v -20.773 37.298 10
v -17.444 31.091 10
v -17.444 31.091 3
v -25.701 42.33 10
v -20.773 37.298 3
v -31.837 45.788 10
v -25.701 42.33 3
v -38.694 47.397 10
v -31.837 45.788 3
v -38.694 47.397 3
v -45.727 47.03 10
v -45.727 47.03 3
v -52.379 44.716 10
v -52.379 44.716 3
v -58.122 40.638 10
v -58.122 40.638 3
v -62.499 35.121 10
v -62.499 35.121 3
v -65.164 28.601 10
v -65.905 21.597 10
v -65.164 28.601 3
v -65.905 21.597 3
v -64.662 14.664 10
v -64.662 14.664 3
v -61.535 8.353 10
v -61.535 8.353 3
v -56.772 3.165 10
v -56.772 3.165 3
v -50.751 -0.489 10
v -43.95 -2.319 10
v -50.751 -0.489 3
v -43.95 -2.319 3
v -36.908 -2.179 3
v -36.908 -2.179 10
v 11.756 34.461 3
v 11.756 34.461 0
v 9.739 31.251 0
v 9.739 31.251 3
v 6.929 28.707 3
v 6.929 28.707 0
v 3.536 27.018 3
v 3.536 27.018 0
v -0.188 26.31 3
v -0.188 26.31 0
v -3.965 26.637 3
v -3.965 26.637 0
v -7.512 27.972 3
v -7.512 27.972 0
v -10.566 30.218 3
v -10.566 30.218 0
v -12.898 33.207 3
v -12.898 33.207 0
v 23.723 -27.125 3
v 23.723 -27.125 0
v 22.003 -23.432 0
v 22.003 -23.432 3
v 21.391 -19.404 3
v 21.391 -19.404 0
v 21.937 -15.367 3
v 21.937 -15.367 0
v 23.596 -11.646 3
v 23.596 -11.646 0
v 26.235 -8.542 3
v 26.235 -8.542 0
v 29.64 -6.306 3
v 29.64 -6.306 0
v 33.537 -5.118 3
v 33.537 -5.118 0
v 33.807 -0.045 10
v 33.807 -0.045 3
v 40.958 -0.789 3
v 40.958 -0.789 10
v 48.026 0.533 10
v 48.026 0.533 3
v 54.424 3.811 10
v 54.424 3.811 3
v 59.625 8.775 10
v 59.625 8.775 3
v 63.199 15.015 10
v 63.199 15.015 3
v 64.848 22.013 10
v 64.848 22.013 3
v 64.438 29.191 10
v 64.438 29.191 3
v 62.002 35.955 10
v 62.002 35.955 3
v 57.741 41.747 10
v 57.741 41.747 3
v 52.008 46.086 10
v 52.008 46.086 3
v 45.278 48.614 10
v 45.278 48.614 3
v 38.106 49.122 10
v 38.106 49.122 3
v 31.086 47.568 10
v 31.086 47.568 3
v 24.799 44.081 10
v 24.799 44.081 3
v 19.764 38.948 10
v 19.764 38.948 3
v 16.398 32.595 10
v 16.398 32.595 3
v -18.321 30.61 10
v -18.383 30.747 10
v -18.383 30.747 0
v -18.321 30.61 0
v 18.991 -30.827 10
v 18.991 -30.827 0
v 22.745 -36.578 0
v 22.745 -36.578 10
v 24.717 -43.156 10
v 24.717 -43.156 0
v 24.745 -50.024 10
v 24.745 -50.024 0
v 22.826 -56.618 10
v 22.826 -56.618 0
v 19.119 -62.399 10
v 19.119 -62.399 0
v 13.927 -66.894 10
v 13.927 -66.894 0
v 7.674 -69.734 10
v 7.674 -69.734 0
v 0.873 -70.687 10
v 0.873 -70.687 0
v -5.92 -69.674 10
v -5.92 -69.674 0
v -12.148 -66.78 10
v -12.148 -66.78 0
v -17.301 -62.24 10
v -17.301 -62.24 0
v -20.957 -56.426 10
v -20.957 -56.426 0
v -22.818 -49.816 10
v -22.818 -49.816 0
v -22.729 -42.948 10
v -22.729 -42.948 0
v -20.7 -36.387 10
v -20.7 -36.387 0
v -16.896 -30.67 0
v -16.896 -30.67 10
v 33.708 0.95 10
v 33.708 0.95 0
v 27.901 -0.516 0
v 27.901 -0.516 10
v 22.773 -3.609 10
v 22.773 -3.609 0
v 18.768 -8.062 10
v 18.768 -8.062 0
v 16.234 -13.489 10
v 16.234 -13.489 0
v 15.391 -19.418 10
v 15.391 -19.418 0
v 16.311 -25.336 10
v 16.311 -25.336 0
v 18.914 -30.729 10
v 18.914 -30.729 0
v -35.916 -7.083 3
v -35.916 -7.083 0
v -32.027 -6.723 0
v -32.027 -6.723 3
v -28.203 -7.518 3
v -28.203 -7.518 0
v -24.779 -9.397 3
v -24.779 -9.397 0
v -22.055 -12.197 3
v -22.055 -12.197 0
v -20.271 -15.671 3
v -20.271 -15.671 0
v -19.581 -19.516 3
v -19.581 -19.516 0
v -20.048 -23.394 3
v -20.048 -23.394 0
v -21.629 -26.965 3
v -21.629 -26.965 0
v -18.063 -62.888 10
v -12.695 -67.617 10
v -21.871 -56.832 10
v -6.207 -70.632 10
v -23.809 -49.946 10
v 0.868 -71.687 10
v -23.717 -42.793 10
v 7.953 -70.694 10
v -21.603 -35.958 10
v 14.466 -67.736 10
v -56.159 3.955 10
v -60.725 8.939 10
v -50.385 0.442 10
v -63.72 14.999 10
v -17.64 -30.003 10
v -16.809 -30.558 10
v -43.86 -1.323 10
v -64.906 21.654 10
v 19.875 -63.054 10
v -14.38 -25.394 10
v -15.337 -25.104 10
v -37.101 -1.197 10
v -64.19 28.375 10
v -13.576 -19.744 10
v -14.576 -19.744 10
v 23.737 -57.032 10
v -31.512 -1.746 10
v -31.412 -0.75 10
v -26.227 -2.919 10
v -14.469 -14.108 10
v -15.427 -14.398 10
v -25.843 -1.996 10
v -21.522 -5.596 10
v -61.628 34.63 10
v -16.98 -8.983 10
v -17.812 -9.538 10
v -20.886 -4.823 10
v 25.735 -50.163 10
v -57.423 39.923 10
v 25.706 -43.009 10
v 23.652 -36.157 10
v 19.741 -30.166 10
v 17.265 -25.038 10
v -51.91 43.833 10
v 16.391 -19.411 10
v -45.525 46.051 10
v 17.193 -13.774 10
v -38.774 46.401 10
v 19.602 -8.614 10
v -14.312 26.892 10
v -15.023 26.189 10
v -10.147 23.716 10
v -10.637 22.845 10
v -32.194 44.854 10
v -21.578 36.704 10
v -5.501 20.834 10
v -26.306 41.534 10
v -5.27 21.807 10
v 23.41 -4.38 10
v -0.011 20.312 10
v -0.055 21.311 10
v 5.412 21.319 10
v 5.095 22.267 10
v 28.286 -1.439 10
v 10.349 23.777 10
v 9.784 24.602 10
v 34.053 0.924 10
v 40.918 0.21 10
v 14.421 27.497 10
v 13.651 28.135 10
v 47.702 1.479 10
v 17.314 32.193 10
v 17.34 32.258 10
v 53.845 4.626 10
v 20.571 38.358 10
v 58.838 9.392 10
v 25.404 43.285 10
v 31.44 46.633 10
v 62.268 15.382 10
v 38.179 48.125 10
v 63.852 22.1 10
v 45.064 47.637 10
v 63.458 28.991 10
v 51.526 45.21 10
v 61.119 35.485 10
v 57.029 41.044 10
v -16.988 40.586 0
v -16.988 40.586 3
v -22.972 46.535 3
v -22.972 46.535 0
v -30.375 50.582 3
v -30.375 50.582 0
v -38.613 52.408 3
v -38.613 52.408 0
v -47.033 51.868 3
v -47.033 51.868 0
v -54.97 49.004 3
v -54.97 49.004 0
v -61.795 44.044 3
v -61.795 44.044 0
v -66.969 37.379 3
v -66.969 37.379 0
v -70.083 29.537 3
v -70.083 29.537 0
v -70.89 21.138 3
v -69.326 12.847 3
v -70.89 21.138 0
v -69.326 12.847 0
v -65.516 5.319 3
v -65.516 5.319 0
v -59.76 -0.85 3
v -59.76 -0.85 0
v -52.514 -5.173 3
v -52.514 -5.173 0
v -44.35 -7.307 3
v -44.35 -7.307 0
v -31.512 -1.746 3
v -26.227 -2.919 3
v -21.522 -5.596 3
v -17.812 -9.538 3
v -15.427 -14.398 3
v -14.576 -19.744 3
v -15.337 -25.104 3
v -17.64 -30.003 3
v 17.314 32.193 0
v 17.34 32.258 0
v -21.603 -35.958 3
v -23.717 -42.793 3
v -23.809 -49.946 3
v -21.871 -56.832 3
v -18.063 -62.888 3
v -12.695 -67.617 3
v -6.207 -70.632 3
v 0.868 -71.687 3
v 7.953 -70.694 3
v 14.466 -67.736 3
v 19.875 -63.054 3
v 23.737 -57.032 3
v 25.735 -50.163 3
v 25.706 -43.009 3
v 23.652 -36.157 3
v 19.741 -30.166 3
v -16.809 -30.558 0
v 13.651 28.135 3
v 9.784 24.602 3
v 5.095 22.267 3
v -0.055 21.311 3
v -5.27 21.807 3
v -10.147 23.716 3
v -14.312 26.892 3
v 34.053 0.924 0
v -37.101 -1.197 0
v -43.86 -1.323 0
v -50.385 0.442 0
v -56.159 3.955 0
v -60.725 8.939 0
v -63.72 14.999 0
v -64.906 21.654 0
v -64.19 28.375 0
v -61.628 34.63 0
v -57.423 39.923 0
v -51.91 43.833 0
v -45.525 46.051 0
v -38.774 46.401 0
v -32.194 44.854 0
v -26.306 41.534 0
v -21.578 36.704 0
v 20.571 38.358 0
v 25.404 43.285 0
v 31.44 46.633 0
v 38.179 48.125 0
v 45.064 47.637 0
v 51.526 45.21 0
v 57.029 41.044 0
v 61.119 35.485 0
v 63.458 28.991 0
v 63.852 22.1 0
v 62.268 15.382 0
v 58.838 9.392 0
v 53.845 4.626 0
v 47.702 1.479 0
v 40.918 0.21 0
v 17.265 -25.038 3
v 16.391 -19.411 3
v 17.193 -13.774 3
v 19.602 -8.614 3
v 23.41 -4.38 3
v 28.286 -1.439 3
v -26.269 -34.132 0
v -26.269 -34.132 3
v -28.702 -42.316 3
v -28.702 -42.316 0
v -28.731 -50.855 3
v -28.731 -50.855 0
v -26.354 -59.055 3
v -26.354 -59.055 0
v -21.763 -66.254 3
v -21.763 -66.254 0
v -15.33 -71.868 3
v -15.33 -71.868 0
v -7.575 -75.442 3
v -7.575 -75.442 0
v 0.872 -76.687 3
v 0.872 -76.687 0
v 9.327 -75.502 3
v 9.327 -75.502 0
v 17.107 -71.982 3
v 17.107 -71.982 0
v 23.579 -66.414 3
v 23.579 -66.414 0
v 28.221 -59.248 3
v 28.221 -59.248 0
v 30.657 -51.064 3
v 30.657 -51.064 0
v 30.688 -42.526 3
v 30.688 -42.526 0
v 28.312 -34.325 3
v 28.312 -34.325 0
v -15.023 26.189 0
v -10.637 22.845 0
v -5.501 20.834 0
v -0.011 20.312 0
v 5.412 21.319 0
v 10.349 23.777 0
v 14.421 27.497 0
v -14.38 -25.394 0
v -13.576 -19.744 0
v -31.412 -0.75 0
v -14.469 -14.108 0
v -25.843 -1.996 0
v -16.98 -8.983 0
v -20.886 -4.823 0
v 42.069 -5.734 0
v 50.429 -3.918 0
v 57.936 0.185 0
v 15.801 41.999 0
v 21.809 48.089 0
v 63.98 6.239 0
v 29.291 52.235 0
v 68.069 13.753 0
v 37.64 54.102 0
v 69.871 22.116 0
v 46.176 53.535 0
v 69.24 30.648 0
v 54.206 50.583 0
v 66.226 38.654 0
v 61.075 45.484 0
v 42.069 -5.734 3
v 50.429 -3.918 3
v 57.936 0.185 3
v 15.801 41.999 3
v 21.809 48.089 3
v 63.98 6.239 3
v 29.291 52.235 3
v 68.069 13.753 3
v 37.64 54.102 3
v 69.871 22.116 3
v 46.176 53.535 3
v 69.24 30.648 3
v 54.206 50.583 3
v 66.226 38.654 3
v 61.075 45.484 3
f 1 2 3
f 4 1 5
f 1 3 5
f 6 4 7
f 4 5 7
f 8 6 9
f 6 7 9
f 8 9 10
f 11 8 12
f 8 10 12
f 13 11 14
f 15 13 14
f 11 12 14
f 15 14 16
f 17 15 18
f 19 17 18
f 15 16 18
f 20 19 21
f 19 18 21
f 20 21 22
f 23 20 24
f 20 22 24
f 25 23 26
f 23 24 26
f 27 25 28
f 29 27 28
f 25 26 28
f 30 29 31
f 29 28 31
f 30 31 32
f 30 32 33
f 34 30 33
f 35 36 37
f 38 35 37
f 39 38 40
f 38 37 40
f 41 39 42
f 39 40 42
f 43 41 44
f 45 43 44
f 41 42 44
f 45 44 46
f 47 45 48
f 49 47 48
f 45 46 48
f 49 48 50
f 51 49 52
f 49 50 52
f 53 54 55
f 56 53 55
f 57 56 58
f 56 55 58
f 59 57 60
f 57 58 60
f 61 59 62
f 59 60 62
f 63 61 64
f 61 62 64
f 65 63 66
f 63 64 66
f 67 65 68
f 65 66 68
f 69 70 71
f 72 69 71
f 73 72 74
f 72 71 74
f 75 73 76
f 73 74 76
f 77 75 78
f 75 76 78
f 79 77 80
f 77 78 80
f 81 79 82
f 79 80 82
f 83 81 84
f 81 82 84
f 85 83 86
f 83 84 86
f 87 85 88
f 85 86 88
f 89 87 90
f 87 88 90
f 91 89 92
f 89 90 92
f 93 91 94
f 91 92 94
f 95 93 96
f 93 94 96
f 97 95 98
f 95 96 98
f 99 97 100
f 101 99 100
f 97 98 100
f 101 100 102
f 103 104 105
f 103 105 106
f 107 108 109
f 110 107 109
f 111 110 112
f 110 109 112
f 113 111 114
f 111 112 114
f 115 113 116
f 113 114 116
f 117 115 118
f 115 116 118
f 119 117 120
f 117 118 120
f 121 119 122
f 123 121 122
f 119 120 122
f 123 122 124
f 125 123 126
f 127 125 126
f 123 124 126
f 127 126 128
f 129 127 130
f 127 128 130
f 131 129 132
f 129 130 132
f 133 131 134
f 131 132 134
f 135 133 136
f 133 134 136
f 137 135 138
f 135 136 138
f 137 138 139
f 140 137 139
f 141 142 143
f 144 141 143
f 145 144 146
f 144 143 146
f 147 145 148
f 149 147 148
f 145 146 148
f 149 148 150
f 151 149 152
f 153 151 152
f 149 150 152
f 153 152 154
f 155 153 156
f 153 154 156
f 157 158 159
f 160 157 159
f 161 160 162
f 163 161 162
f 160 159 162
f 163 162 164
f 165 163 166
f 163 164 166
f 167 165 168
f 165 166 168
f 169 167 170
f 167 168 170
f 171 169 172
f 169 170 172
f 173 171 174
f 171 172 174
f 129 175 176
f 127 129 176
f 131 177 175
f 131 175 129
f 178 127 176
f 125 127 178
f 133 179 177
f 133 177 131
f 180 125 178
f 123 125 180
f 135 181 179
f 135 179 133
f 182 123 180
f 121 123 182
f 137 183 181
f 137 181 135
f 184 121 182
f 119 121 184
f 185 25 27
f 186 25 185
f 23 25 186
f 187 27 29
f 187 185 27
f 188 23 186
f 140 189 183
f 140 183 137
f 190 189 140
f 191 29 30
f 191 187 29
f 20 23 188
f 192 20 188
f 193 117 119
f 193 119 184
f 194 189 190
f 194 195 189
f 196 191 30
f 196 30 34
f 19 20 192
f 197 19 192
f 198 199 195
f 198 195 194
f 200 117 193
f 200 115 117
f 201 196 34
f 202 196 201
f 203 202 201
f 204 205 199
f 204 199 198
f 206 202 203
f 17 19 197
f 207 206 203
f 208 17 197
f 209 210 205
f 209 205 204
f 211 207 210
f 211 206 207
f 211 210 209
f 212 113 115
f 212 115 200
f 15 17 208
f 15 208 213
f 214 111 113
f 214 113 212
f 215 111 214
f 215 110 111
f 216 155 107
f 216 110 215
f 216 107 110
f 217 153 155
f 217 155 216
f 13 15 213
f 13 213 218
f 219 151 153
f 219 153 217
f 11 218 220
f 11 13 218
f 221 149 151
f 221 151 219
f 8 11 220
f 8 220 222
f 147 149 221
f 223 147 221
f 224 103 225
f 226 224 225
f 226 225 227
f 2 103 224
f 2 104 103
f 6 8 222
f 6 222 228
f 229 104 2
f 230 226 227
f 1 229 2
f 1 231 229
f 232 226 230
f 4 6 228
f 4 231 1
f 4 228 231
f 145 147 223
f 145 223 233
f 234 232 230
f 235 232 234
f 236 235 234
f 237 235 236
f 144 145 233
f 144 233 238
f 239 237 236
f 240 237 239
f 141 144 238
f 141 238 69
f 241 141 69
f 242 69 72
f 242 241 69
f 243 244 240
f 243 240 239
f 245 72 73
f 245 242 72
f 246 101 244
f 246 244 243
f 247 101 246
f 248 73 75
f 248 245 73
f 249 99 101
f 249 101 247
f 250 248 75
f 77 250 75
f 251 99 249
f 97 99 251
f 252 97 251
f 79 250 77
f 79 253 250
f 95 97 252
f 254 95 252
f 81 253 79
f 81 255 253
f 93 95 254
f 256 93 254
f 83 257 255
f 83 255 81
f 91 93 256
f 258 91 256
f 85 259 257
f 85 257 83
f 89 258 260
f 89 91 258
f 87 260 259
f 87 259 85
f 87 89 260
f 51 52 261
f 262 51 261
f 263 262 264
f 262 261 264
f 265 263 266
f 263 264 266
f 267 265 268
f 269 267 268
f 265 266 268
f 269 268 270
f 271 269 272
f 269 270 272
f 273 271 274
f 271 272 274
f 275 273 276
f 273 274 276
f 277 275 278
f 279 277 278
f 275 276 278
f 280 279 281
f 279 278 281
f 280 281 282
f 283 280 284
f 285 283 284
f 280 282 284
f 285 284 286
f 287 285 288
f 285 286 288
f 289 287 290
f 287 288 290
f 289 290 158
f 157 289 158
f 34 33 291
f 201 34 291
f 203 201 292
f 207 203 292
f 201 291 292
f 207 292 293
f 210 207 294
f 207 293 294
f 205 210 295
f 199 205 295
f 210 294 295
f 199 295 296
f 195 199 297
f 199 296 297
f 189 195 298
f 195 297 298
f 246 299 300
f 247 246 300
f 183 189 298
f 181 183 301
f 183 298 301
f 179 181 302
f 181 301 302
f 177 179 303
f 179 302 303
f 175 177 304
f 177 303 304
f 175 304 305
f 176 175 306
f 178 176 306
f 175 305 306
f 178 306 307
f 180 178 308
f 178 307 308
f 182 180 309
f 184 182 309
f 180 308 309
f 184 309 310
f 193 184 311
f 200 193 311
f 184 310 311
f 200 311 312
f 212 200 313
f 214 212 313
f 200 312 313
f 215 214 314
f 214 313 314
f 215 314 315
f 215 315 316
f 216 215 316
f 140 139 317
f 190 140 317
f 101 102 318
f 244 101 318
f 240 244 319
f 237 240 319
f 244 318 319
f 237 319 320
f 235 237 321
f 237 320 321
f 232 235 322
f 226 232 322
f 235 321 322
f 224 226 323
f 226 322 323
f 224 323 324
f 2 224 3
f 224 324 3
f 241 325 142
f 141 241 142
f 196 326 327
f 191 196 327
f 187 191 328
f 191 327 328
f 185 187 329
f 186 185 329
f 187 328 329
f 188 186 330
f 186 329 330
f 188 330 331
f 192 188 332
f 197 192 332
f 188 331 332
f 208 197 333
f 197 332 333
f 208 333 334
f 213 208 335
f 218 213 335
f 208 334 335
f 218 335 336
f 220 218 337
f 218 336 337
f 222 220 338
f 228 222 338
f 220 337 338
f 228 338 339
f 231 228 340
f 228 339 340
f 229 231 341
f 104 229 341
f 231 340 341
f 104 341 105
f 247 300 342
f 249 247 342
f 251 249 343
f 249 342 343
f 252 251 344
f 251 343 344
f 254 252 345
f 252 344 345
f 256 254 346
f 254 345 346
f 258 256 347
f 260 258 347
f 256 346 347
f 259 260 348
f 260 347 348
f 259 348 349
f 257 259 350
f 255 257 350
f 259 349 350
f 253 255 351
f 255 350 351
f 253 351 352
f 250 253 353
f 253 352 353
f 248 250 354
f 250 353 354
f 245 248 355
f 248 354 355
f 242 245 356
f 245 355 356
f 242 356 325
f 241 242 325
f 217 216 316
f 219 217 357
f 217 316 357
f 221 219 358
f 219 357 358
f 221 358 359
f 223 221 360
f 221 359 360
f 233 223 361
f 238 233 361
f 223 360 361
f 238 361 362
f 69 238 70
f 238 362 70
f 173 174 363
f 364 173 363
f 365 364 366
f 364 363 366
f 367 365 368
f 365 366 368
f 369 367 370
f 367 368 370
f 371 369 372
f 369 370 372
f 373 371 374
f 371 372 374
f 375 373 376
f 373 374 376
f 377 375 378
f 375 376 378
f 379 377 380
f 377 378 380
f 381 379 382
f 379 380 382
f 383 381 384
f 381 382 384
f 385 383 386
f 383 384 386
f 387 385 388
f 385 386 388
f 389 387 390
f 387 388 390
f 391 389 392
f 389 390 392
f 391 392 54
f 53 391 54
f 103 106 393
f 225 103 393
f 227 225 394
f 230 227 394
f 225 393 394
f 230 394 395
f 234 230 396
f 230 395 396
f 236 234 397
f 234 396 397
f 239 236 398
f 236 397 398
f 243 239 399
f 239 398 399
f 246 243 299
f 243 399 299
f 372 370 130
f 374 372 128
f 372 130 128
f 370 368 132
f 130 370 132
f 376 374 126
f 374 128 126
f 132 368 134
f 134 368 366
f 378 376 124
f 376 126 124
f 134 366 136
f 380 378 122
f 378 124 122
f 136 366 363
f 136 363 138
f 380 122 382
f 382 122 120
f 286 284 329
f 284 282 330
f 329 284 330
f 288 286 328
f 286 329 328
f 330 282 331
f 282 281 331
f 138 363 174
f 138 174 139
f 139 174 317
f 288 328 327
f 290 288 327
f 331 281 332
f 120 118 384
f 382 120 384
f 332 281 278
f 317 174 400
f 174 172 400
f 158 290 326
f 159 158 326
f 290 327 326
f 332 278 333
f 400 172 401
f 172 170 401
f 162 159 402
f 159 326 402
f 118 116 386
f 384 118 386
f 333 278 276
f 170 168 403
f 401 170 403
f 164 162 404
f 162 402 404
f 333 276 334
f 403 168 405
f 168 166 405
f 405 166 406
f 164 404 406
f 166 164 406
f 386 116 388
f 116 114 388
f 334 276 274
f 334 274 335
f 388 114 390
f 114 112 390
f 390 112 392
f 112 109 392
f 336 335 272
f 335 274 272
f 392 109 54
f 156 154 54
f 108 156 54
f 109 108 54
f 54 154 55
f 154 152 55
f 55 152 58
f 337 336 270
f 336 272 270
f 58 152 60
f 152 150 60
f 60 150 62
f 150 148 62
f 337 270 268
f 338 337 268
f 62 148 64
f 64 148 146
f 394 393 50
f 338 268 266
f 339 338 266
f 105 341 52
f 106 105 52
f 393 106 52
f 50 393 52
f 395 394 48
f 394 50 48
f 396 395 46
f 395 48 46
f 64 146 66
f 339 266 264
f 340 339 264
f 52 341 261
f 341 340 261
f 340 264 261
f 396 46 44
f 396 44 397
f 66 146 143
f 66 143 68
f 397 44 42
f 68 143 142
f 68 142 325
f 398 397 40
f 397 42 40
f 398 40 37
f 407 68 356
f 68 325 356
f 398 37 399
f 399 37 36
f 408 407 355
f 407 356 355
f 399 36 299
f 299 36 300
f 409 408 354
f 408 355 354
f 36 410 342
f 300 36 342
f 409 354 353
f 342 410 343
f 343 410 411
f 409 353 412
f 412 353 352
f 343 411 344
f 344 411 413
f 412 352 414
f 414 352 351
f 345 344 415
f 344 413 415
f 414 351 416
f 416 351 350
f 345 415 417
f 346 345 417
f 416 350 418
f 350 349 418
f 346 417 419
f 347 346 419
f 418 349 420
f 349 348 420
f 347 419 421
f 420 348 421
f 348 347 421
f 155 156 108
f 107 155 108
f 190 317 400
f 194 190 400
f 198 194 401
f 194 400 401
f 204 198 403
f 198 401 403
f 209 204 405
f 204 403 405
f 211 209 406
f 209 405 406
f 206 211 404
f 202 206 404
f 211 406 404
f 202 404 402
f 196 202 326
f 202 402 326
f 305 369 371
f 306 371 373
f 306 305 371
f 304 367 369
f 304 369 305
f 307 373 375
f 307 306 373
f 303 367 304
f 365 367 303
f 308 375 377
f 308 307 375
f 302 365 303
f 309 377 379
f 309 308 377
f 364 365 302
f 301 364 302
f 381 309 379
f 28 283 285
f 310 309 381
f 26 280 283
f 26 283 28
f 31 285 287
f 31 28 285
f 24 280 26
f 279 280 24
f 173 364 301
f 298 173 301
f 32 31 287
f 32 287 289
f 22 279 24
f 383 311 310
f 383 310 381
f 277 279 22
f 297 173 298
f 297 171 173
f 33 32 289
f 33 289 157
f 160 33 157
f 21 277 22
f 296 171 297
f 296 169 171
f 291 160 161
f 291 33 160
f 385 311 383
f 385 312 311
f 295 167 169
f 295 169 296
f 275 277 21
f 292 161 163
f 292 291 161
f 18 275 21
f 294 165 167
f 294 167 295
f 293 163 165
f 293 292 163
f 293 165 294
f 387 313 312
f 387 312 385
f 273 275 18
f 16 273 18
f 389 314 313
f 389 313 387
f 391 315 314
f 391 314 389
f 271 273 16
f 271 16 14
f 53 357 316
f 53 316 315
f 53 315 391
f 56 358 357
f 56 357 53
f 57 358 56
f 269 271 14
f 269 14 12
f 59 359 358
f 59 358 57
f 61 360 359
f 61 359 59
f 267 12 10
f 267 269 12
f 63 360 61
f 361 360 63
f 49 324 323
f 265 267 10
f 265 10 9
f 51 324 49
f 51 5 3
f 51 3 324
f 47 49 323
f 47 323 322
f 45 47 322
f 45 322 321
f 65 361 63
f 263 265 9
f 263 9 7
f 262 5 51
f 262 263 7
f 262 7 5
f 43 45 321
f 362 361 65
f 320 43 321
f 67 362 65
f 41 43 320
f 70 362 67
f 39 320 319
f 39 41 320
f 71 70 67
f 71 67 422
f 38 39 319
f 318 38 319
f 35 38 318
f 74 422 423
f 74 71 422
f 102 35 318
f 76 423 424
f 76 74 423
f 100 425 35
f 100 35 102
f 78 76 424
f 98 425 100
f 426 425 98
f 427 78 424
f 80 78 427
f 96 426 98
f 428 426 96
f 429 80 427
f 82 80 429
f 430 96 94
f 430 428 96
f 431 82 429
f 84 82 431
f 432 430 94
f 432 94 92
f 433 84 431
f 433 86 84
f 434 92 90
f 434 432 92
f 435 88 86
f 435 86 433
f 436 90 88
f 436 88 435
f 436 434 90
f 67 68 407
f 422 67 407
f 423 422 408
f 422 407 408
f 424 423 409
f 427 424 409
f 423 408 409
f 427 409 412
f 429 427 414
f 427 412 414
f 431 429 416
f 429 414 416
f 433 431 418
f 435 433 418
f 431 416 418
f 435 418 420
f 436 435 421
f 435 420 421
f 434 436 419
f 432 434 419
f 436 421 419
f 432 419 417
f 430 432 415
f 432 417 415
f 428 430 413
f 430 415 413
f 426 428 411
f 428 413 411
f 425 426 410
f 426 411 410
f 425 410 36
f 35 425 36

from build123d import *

# Parameters (mm, degrees)
F1_DEPTH = 3
F2_DEPTH = 10


with BuildPart() as f1:
    # F0 (on Top) → F1 (new body)
    with BuildSketch(Plane.XY):
        with BuildLine():
            ThreePointArc((11.75598, 34.46051), (-0.188241, 26.310271), (-12.897683, 33.206712))
            ThreePointArc((-12.897683, 33.206712), (-66.969323, 37.378844), (-35.915981, -7.082813))
            ThreePointArc((-35.915981, -7.082813), (-22.055212, -12.196979), (-21.628703, -26.964976))
            ThreePointArc((-21.628703, -26.964976), (0.871706, -76.686678), (23.722724, -27.12513))
            ThreePointArc((23.722724, -27.12513), (22.633328, -13.447379), (33.536886, -5.117908))
            ThreePointArc((33.536886, -5.117908), (66.226082, 38.654176), (11.75598, 34.46051))
        make_face()
        with BuildLine():
            ThreePointArc((-36.907983, -2.179073), (-62.499458, 35.120673), (-17.444433, 31.090865))
            ThreePointArc((-17.444433, 31.090865), (-0.055128, 21.310967), (16.39825, 32.594616))
            ThreePointArc((16.39825, 32.594616), (62.001748, 35.955299), (33.807071, -0.045165))
            ThreePointArc((33.807071, -0.045165), (18.206542, -11.104836), (19.741163, -30.166258))
            ThreePointArc((19.741163, -30.166258), (0.868135, -71.686626), (-17.640413, -30.002506))
            ThreePointArc((-17.640413, -30.002506), (-17.812054, -9.538309), (-36.907983, -2.179073))
        make_face(mode=Mode.SUBTRACT)
    extrude(amount=F1_DEPTH)

    # F0 (on Top) → F2 (join)
    with BuildSketch(Plane.XY):
        with BuildLine():
            ThreePointArc((16.39825, 32.594616), (-0.055128, 21.310967), (-17.444433, 31.090865))
            ThreePointArc((-17.444433, 31.090865), (-62.499458, 35.120673), (-36.907983, -2.179073))
            ThreePointArc((-36.907983, -2.179073), (-17.812054, -9.538309), (-17.640413, -30.002506))
            ThreePointArc((-17.640413, -30.002506), (0.868135, -71.686626), (19.741163, -30.166258))
            ThreePointArc((19.741163, -30.166258), (18.206542, -11.104836), (33.807071, -0.045165))
            ThreePointArc((33.807071, -0.045165), (62.001748, 35.955299), (16.39825, 32.594616))
        make_face()
        with BuildLine():
            ThreePointArc((-37.101393, -1.197366), (-61.627895, 34.630095), (-18.383489, 30.747101))
            Line((-18.383489, 30.747101), (-18.321174, 30.609903))
            ThreePointArc((-18.321174, 30.609903), (-0.010738, 20.311953), (17.314193, 32.193309))
            Line((17.314193, 32.193309), (17.340047, 32.258435))
            ThreePointArc((17.340047, 32.258435), (61.119406, 35.484691), (34.052515, 0.924246))
            Line((34.052515, 0.924246), (33.70776, 0.949892))
            ThreePointArc((33.70776, 0.949892), (17.300467, -10.681719), (18.914449, -30.728881))
            Line((18.914449, -30.728881), (18.990622, -30.827082))
            ThreePointArc((18.990622, -30.827082), (0.872515, -70.686635), (-16.895691, -30.669881))
            Line((-16.895691, -30.669881), (-16.808859, -30.55795))
            ThreePointArc((-16.808859, -30.55795), (-16.979997, -8.983359), (-37.101393, -1.197366))
        make_face(mode=Mode.SUBTRACT)
    extrude(amount=F2_DEPTH)


solid = f1.part
